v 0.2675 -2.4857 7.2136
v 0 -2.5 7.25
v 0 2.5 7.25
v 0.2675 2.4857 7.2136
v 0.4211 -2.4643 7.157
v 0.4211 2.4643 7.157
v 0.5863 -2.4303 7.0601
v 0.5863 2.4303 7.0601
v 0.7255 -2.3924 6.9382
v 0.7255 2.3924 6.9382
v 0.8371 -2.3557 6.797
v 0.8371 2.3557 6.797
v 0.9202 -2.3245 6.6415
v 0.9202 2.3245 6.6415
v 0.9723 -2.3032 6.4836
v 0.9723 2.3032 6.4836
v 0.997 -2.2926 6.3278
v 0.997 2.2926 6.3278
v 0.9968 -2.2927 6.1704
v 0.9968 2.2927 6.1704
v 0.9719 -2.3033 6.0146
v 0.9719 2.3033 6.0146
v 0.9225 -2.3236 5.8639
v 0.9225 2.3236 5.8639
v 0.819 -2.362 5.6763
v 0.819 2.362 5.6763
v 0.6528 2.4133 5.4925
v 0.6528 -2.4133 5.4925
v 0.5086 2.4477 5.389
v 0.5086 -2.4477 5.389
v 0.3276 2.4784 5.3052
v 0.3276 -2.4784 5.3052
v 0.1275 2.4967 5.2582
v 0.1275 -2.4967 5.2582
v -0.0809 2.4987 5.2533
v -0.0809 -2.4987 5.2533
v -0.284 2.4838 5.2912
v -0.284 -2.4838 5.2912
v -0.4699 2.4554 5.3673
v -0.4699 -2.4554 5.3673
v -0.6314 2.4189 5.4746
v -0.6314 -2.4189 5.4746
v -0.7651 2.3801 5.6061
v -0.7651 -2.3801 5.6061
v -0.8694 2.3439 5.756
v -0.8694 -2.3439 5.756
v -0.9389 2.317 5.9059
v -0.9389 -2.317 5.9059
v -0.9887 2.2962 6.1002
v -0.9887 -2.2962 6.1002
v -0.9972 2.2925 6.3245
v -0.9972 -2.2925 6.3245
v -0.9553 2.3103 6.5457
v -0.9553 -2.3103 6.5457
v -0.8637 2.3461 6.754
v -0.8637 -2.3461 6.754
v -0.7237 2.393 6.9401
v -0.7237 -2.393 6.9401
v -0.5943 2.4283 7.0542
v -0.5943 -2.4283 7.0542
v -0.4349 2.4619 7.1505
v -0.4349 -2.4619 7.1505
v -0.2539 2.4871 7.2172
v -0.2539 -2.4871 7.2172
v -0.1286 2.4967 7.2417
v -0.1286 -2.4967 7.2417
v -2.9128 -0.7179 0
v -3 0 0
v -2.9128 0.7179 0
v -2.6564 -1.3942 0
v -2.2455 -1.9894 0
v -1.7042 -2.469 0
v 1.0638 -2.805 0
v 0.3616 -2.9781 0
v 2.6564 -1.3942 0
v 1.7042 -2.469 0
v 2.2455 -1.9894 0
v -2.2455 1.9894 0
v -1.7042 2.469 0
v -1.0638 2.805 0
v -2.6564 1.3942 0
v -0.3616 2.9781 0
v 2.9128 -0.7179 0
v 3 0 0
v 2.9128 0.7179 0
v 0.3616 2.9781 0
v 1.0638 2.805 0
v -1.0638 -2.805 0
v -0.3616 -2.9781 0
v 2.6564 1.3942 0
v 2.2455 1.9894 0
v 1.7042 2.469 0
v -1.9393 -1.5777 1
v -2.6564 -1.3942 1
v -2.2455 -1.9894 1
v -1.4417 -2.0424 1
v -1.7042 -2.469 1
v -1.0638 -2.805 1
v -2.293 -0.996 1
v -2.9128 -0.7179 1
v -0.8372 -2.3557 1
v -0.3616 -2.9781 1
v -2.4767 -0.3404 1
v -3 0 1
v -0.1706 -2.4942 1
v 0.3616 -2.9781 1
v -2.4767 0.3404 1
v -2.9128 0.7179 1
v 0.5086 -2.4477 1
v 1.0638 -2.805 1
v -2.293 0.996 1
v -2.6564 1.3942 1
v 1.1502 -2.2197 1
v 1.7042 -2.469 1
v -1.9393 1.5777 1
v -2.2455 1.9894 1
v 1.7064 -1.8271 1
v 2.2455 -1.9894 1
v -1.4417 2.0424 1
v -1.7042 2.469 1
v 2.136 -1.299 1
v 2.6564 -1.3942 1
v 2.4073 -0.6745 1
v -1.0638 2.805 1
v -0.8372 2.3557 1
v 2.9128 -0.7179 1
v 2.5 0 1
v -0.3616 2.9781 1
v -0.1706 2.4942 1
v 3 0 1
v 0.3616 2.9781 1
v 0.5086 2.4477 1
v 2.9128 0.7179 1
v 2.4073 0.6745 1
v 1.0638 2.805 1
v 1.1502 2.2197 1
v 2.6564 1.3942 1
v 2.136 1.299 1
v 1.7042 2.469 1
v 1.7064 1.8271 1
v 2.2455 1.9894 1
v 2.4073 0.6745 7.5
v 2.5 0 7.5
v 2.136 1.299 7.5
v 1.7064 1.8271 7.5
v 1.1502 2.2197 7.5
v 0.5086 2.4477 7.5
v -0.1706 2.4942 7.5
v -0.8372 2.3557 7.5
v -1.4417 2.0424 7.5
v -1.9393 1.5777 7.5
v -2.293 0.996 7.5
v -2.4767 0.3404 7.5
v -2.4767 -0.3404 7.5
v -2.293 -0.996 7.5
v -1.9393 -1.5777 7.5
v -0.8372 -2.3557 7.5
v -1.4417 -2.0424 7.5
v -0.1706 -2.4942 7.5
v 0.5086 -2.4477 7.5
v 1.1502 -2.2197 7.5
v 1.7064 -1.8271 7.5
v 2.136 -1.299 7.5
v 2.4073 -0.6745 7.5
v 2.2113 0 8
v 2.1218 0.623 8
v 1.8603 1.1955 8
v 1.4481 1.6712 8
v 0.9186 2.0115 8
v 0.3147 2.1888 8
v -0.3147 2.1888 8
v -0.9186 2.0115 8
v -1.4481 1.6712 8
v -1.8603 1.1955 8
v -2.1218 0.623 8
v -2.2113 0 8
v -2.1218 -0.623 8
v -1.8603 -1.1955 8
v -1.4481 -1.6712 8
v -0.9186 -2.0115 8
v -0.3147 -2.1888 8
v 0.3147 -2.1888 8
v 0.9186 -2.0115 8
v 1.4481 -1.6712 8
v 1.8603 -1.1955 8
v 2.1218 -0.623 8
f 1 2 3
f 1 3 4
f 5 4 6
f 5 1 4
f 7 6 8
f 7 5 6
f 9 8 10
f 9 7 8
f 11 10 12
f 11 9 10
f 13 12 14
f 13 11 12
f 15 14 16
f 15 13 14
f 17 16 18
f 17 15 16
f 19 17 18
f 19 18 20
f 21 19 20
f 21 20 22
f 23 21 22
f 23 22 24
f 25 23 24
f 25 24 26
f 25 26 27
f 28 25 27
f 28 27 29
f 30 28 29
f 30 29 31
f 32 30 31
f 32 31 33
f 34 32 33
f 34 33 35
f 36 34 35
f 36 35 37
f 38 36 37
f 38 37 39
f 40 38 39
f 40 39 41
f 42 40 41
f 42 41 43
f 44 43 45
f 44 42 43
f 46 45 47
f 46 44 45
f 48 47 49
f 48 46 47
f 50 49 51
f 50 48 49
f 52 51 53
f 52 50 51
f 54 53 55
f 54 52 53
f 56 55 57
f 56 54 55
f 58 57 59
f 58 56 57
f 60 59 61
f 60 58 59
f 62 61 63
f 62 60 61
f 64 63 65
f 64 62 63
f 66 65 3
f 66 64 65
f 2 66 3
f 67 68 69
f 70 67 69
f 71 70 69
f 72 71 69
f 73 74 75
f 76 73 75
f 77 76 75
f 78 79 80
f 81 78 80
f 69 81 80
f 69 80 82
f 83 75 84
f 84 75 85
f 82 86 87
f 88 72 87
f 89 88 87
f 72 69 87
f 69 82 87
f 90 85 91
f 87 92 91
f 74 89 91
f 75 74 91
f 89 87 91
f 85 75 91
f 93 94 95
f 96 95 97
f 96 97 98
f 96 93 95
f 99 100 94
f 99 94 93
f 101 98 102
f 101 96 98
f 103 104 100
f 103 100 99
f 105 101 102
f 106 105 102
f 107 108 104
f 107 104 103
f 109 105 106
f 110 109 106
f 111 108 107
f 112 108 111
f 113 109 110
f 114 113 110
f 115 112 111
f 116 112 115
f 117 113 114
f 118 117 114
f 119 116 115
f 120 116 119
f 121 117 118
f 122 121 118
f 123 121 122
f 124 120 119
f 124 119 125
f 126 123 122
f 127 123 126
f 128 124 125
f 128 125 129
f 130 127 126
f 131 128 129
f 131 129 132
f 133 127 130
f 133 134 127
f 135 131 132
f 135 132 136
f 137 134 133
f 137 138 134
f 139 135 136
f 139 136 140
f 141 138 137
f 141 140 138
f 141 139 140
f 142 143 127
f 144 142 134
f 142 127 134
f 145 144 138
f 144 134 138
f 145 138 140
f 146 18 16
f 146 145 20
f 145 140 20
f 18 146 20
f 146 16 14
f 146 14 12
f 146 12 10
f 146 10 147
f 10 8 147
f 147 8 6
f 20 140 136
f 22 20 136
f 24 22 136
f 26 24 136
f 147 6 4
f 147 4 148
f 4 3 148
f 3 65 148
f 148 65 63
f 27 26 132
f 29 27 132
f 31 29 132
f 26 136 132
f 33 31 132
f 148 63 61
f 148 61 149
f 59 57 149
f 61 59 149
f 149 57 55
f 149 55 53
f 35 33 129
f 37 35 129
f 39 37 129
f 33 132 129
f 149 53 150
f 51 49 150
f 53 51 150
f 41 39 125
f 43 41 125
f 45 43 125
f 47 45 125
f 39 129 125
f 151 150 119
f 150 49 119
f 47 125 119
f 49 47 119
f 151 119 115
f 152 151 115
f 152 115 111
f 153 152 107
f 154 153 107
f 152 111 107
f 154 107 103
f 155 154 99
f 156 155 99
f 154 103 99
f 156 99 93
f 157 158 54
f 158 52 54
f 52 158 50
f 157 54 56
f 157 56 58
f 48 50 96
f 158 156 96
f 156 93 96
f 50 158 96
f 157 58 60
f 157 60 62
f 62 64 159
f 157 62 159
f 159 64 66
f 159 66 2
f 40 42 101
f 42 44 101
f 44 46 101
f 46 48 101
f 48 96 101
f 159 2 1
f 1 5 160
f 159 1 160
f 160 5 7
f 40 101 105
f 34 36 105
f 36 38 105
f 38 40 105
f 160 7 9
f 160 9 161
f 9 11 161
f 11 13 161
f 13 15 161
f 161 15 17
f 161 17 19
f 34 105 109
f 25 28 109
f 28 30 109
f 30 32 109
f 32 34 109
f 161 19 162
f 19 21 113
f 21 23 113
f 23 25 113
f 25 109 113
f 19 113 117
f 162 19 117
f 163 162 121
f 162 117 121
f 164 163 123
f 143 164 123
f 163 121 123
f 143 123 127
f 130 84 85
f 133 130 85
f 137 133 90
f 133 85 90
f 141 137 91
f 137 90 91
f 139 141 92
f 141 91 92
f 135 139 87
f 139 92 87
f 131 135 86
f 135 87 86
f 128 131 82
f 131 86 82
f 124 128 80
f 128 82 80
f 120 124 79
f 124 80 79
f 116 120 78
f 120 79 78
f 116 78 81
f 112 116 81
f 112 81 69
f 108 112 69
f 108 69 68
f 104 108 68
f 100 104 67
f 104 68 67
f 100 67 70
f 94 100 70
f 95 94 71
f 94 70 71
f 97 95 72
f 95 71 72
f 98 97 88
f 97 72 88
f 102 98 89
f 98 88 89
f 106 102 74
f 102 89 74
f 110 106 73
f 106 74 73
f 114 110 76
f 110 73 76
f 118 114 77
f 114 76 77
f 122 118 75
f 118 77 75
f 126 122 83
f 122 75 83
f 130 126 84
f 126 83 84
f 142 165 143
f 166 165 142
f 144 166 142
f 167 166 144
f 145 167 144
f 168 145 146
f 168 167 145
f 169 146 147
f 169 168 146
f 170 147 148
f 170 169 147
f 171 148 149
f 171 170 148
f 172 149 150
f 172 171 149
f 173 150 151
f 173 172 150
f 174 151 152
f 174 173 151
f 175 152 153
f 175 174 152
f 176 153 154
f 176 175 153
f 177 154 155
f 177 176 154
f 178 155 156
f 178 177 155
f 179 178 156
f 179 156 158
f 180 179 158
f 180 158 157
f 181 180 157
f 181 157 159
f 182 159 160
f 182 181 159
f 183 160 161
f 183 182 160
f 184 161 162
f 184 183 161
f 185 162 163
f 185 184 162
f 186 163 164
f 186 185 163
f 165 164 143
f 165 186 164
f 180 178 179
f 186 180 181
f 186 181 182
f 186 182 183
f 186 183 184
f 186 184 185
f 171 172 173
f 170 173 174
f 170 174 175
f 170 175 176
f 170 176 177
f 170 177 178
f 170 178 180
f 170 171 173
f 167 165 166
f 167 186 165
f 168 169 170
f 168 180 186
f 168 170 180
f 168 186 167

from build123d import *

# Parameters (mm, degrees)
SKETCH_1_R               = 3
EXTRUDE_1_DEPTH          = 1
SKETCH_1_3_R             = 2.5
EXTRUDE_2_DEPTH          = 8
CHAMFER_1_SIZE           = 0.5
CHAMFER_1_SIZE2          = 0.288675135
CUT_EXTRUDE_1_DEPTH      = 10.055385138
CUT_EXTRUDE_1_DEPTH_BACK = 10.055385138
SKETCH_2_R               = 1


with BuildPart() as part:
    # 草圖1 → 填料-伸長1 (new body)
    with BuildSketch(Plane.XY):
        Circle(SKETCH_1_R)
    extrude(amount=EXTRUDE_1_DEPTH)

    # 草圖1<3> → 填料-伸長2 (add)
    with BuildSketch(Plane.XY):
        Circle(SKETCH_1_3_R)
    extrude(amount=EXTRUDE_2_DEPTH)

    # 導角1
    chamfer_1_edges = [part.edges().sort_by_distance(p)[0] for p in [
        (-2.5, 0, 8),
    ]]
    chamfer_1_side = [part.faces().sort_by_distance(p)[0] for p in [
        (-2.5, 0, 4.5),
    ]]
    chamfer(chamfer_1_edges, length=CHAMFER_1_SIZE, length2=CHAMFER_1_SIZE2, reference=chamfer_1_side[0])

    # 草圖2 → 除料-伸長1 (cut, two sides: drawn at the far end of the back side and taken through both)
    with BuildSketch(Plane(origin=(0, 0, 0), x_dir=(1, 0, 0), z_dir=(0, 1, 0)).offset(-CUT_EXTRUDE_1_DEPTH_BACK)):
        with Locations((0, -6.25)):
            Circle(SKETCH_2_R)
    extrude(amount=CUT_EXTRUDE_1_DEPTH + CUT_EXTRUDE_1_DEPTH_BACK, mode=Mode.SUBTRACT)


solid = part.part
